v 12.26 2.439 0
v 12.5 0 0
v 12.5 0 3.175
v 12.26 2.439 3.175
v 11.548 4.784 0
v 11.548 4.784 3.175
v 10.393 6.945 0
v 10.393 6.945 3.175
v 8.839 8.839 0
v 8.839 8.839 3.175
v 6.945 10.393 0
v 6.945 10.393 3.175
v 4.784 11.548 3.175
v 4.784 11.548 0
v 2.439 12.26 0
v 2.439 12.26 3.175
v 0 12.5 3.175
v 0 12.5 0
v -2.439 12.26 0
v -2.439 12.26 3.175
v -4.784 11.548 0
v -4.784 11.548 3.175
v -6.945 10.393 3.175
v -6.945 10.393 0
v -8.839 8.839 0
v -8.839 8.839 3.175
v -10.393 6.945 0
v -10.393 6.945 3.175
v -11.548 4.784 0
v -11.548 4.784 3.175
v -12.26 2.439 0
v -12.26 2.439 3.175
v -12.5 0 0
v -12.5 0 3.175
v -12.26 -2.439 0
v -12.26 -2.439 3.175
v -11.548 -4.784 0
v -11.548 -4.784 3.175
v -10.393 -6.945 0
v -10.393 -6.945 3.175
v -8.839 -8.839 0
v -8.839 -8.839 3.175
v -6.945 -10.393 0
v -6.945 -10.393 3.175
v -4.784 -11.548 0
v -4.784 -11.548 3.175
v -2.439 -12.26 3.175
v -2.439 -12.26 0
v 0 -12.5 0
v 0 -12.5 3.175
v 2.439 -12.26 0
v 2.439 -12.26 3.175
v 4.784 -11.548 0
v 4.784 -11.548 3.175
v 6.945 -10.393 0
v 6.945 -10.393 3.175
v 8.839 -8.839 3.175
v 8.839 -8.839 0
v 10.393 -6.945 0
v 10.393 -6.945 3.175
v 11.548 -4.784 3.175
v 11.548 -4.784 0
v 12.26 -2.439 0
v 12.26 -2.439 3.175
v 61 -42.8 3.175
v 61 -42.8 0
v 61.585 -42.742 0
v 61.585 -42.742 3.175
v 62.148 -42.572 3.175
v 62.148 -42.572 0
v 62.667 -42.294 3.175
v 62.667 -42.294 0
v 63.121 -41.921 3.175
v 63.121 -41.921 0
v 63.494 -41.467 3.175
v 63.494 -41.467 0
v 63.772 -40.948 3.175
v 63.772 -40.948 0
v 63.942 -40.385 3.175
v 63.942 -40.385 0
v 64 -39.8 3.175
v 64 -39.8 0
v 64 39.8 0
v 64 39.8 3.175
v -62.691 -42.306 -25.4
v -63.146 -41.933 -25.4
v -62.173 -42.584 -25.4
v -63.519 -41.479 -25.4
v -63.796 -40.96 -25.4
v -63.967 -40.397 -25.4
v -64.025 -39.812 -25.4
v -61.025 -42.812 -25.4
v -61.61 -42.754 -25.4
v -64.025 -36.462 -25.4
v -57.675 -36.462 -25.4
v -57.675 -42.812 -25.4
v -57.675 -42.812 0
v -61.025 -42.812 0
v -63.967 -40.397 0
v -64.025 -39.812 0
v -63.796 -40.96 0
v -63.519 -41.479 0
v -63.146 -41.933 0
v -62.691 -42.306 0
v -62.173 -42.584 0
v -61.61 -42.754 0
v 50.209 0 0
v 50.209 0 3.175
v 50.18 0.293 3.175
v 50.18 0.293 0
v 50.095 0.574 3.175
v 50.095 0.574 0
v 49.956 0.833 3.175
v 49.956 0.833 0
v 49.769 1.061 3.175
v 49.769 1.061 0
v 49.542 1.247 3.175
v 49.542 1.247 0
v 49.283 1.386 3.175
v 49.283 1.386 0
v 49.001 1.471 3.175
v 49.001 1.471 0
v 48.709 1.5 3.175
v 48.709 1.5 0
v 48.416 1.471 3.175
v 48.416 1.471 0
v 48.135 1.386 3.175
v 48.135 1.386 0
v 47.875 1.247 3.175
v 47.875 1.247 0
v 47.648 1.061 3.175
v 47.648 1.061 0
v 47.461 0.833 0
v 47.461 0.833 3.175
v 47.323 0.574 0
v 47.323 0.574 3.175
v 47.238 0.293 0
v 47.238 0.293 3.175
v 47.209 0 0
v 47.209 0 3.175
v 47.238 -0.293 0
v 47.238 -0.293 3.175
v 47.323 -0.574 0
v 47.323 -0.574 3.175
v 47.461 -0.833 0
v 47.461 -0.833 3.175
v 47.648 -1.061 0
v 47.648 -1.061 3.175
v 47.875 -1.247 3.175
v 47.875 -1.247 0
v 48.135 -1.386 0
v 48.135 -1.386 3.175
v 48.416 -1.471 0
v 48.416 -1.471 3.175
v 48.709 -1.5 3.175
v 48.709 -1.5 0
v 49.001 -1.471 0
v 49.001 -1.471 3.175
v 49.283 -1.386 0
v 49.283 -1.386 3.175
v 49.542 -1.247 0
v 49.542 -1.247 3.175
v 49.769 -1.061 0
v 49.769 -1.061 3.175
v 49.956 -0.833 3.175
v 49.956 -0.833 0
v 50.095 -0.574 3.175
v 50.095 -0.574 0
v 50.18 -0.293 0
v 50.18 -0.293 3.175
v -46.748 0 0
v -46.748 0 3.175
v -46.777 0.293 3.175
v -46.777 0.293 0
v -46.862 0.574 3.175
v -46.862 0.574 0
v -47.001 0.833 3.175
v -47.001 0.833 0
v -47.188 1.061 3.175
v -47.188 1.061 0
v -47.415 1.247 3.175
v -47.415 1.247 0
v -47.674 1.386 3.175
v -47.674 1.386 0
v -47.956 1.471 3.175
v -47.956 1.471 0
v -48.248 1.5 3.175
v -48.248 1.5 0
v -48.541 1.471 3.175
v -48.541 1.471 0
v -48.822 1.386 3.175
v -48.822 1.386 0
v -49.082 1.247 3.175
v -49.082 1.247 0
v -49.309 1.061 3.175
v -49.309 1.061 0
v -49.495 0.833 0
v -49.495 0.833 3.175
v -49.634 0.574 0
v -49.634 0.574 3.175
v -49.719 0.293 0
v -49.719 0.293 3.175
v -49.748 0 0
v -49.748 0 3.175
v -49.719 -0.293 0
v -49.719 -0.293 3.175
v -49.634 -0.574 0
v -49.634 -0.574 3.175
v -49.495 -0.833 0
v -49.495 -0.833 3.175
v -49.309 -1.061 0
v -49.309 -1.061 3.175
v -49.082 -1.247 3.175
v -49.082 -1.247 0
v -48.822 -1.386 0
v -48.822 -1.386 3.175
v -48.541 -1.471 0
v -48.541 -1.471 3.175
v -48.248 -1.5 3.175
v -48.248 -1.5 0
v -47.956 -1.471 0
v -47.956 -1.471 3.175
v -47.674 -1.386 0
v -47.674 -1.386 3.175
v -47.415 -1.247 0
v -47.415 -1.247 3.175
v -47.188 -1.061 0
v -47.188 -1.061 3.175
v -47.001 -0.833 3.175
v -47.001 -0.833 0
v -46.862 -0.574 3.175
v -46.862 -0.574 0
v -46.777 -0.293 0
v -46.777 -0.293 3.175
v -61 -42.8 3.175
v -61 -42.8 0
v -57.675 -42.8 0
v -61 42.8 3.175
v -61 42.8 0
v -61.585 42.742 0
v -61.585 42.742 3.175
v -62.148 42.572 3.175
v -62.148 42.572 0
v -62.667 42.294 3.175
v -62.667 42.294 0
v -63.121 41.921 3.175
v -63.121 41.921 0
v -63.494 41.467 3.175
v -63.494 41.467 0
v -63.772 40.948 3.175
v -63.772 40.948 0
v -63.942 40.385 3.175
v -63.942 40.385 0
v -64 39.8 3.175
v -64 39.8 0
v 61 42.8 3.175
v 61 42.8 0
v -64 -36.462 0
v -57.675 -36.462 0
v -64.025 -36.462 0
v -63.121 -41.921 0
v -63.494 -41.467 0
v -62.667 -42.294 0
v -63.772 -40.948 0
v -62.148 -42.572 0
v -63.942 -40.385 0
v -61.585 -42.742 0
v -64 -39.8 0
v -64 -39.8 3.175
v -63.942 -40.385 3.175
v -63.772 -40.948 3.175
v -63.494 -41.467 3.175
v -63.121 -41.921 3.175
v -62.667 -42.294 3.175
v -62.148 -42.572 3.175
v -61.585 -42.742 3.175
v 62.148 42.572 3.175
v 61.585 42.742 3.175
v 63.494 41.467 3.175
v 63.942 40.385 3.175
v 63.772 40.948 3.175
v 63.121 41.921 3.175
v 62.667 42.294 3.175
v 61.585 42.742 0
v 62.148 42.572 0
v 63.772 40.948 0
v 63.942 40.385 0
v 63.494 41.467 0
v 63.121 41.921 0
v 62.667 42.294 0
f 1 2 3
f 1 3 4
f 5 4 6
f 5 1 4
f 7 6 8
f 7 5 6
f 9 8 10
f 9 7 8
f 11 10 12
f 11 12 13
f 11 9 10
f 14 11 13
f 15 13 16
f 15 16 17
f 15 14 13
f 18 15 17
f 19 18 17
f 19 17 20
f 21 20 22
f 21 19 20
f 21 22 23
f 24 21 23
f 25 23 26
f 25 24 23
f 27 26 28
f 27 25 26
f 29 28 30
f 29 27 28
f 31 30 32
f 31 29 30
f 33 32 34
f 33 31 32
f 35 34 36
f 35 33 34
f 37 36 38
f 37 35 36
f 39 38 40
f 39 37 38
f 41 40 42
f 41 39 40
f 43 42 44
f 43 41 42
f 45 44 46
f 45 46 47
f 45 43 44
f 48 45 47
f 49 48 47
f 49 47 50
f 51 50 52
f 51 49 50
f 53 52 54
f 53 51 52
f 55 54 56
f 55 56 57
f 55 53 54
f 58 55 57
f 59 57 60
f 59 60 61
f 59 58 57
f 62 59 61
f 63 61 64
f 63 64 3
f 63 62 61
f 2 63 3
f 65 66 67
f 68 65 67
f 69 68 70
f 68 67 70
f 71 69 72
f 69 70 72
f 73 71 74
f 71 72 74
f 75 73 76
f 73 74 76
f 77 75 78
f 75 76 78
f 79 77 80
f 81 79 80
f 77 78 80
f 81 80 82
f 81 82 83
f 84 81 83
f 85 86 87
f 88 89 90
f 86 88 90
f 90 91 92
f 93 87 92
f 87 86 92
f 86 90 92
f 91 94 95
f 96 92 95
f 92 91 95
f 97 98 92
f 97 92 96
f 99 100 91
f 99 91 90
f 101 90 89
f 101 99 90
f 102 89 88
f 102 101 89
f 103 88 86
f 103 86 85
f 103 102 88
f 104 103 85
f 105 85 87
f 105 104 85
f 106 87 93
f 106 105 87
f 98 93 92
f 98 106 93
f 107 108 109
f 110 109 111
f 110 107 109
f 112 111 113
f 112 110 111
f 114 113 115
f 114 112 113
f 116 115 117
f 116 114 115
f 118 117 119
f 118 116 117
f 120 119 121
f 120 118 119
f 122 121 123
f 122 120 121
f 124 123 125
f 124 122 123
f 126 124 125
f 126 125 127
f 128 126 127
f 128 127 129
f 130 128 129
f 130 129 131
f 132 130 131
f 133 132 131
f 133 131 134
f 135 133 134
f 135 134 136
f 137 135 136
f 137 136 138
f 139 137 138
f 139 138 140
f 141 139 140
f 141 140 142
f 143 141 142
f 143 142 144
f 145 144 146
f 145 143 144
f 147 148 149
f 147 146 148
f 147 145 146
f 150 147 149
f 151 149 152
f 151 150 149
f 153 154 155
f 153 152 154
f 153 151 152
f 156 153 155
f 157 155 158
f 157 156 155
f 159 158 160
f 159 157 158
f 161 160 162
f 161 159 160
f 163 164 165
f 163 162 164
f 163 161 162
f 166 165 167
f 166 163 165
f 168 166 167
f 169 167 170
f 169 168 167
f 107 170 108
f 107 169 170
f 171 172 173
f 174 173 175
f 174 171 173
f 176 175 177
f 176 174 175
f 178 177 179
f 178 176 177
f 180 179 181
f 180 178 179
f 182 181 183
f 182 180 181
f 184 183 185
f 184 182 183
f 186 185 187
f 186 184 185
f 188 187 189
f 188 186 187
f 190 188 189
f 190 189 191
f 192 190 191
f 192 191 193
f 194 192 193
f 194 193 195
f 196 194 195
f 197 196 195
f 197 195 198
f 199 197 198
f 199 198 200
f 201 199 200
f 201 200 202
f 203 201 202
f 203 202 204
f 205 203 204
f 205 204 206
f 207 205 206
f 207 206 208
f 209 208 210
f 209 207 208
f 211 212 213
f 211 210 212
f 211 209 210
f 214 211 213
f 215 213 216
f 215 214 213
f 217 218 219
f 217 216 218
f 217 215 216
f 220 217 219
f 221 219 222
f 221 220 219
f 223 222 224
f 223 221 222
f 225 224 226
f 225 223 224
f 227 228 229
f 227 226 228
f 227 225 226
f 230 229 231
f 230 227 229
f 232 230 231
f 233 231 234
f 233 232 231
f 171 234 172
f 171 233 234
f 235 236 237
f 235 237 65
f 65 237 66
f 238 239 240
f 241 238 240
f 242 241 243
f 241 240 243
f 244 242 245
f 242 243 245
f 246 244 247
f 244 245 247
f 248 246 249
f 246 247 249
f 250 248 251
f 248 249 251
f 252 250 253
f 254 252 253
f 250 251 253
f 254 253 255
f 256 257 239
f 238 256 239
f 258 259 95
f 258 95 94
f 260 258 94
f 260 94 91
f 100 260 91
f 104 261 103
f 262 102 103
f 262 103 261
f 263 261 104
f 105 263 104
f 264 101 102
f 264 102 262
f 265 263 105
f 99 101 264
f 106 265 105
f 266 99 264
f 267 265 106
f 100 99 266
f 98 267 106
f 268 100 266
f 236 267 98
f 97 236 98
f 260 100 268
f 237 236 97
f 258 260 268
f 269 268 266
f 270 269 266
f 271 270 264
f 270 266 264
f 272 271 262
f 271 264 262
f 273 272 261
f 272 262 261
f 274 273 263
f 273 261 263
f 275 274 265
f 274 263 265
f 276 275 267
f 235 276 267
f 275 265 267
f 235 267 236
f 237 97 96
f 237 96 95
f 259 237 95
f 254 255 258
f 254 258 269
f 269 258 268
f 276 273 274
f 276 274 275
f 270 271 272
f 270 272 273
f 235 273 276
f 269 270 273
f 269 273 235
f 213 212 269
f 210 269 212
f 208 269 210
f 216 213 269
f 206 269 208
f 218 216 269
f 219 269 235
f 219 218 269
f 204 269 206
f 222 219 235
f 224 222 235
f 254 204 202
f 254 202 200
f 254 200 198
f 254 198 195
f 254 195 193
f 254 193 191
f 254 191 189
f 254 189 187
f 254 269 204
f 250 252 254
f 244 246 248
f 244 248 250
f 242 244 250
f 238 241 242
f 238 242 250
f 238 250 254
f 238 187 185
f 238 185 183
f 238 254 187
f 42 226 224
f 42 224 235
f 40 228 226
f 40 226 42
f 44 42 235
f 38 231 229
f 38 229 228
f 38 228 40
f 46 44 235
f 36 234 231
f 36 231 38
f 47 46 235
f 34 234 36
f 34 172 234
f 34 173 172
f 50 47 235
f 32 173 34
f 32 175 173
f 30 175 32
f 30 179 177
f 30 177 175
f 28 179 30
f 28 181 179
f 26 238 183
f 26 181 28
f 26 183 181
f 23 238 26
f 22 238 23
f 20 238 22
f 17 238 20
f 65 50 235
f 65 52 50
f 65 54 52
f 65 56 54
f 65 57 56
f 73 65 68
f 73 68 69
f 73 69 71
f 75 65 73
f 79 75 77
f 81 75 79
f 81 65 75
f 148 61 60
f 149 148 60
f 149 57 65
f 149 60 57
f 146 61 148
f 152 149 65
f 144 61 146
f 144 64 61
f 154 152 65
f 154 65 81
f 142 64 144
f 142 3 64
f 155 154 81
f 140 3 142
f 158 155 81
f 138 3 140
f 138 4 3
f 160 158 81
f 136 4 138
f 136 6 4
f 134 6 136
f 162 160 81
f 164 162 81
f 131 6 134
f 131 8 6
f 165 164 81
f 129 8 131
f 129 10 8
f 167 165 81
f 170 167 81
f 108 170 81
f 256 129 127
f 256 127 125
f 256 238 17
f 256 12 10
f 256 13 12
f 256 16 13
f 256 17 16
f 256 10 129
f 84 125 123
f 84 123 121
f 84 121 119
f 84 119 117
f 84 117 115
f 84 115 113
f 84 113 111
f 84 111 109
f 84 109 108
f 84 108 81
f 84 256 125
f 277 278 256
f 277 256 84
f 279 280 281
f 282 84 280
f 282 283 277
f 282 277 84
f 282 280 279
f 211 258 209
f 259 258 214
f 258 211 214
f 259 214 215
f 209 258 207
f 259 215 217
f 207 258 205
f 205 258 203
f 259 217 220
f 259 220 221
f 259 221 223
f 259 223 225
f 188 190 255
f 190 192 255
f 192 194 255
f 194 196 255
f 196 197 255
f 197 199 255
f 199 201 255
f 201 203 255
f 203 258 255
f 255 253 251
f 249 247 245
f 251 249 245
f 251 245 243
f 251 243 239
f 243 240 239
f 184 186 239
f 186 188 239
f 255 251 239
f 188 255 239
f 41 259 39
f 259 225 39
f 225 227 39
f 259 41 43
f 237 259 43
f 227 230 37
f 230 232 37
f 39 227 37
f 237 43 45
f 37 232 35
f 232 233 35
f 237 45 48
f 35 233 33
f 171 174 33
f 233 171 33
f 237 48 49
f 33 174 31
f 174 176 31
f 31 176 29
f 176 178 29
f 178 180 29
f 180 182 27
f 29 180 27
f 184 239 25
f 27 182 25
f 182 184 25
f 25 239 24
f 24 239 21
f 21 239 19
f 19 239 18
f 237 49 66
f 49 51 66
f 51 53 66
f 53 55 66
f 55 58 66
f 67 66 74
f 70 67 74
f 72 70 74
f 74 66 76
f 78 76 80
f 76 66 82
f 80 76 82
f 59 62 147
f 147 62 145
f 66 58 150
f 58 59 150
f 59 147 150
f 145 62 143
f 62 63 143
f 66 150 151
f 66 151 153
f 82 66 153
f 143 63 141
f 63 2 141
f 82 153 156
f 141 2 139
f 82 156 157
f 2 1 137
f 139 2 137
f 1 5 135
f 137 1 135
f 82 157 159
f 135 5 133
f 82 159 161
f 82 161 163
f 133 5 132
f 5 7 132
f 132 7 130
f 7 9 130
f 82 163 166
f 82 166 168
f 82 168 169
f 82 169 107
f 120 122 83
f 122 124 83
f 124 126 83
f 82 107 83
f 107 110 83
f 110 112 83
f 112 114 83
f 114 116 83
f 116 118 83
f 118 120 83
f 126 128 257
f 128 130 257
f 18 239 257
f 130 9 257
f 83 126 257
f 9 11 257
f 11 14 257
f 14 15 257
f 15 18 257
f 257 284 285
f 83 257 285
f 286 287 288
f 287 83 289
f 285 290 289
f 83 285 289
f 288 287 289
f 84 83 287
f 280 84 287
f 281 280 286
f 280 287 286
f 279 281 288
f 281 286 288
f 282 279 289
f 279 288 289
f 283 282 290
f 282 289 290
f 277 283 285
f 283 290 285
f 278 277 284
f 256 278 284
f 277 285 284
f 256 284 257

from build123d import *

# Parameters (mm, degrees)
F0_R     = 12.5
F1_DEPTH = 3.175
F3_DEPTH = 25.4
F4_R     = 1.5
F5_DEPTH = 25


with BuildPart() as f1:
    # F0 (on Top) → F1 (new body)
    with BuildSketch(Plane.XY):
        with BuildLine():
            Line((61, 42.8), (-61, 42.8))
            ThreePointArc((-61, 42.8), (-63.12132, 41.92132), (-64, 39.8))
            Line((-64, 39.8), (-64, -39.8))
            ThreePointArc((-64, -39.8), (-63.12132, -41.92132), (-61, -42.8))
            Line((-61, -42.8), (61, -42.8))
            ThreePointArc((61, -42.8), (63.12132, -41.92132), (64, -39.8))
            Line((64, -39.8), (64, 39.8))
            ThreePointArc((64, 39.8), (63.12132, 41.92132), (61, 42.8))
        make_face()
        Circle(F0_R, mode=Mode.SUBTRACT)
    extrude(amount=F1_DEPTH)

    # F2 (on Top) → F3 (join)
    with BuildSketch(Plane.XY):
        with BuildLine():
            Line((-57.674601, -36.461943), (-64.024601, -36.461943))
            Line((-64.024601, -36.461943), (-64.024601, -39.811943))
            ThreePointArc((-64.024601, -39.811943), (-63.145921, -41.933263), (-61.024601, -42.811943))
            Line((-61.024601, -42.811943), (-57.674601, -42.811943))
            Line((-57.674601, -42.811943), (-57.674601, -36.461943))
        make_face()
    extrude(amount=-F3_DEPTH)

    # F4 (on Top) → F5 (cut)
    with BuildSketch(Plane.XY):
        with Locations((-48.248243, 0)):
            Circle(F4_R)
        with Locations((48.708693, 0)):
            Circle(F4_R)
    extrude(amount=F5_DEPTH, mode=Mode.SUBTRACT)


solid = f1.part
